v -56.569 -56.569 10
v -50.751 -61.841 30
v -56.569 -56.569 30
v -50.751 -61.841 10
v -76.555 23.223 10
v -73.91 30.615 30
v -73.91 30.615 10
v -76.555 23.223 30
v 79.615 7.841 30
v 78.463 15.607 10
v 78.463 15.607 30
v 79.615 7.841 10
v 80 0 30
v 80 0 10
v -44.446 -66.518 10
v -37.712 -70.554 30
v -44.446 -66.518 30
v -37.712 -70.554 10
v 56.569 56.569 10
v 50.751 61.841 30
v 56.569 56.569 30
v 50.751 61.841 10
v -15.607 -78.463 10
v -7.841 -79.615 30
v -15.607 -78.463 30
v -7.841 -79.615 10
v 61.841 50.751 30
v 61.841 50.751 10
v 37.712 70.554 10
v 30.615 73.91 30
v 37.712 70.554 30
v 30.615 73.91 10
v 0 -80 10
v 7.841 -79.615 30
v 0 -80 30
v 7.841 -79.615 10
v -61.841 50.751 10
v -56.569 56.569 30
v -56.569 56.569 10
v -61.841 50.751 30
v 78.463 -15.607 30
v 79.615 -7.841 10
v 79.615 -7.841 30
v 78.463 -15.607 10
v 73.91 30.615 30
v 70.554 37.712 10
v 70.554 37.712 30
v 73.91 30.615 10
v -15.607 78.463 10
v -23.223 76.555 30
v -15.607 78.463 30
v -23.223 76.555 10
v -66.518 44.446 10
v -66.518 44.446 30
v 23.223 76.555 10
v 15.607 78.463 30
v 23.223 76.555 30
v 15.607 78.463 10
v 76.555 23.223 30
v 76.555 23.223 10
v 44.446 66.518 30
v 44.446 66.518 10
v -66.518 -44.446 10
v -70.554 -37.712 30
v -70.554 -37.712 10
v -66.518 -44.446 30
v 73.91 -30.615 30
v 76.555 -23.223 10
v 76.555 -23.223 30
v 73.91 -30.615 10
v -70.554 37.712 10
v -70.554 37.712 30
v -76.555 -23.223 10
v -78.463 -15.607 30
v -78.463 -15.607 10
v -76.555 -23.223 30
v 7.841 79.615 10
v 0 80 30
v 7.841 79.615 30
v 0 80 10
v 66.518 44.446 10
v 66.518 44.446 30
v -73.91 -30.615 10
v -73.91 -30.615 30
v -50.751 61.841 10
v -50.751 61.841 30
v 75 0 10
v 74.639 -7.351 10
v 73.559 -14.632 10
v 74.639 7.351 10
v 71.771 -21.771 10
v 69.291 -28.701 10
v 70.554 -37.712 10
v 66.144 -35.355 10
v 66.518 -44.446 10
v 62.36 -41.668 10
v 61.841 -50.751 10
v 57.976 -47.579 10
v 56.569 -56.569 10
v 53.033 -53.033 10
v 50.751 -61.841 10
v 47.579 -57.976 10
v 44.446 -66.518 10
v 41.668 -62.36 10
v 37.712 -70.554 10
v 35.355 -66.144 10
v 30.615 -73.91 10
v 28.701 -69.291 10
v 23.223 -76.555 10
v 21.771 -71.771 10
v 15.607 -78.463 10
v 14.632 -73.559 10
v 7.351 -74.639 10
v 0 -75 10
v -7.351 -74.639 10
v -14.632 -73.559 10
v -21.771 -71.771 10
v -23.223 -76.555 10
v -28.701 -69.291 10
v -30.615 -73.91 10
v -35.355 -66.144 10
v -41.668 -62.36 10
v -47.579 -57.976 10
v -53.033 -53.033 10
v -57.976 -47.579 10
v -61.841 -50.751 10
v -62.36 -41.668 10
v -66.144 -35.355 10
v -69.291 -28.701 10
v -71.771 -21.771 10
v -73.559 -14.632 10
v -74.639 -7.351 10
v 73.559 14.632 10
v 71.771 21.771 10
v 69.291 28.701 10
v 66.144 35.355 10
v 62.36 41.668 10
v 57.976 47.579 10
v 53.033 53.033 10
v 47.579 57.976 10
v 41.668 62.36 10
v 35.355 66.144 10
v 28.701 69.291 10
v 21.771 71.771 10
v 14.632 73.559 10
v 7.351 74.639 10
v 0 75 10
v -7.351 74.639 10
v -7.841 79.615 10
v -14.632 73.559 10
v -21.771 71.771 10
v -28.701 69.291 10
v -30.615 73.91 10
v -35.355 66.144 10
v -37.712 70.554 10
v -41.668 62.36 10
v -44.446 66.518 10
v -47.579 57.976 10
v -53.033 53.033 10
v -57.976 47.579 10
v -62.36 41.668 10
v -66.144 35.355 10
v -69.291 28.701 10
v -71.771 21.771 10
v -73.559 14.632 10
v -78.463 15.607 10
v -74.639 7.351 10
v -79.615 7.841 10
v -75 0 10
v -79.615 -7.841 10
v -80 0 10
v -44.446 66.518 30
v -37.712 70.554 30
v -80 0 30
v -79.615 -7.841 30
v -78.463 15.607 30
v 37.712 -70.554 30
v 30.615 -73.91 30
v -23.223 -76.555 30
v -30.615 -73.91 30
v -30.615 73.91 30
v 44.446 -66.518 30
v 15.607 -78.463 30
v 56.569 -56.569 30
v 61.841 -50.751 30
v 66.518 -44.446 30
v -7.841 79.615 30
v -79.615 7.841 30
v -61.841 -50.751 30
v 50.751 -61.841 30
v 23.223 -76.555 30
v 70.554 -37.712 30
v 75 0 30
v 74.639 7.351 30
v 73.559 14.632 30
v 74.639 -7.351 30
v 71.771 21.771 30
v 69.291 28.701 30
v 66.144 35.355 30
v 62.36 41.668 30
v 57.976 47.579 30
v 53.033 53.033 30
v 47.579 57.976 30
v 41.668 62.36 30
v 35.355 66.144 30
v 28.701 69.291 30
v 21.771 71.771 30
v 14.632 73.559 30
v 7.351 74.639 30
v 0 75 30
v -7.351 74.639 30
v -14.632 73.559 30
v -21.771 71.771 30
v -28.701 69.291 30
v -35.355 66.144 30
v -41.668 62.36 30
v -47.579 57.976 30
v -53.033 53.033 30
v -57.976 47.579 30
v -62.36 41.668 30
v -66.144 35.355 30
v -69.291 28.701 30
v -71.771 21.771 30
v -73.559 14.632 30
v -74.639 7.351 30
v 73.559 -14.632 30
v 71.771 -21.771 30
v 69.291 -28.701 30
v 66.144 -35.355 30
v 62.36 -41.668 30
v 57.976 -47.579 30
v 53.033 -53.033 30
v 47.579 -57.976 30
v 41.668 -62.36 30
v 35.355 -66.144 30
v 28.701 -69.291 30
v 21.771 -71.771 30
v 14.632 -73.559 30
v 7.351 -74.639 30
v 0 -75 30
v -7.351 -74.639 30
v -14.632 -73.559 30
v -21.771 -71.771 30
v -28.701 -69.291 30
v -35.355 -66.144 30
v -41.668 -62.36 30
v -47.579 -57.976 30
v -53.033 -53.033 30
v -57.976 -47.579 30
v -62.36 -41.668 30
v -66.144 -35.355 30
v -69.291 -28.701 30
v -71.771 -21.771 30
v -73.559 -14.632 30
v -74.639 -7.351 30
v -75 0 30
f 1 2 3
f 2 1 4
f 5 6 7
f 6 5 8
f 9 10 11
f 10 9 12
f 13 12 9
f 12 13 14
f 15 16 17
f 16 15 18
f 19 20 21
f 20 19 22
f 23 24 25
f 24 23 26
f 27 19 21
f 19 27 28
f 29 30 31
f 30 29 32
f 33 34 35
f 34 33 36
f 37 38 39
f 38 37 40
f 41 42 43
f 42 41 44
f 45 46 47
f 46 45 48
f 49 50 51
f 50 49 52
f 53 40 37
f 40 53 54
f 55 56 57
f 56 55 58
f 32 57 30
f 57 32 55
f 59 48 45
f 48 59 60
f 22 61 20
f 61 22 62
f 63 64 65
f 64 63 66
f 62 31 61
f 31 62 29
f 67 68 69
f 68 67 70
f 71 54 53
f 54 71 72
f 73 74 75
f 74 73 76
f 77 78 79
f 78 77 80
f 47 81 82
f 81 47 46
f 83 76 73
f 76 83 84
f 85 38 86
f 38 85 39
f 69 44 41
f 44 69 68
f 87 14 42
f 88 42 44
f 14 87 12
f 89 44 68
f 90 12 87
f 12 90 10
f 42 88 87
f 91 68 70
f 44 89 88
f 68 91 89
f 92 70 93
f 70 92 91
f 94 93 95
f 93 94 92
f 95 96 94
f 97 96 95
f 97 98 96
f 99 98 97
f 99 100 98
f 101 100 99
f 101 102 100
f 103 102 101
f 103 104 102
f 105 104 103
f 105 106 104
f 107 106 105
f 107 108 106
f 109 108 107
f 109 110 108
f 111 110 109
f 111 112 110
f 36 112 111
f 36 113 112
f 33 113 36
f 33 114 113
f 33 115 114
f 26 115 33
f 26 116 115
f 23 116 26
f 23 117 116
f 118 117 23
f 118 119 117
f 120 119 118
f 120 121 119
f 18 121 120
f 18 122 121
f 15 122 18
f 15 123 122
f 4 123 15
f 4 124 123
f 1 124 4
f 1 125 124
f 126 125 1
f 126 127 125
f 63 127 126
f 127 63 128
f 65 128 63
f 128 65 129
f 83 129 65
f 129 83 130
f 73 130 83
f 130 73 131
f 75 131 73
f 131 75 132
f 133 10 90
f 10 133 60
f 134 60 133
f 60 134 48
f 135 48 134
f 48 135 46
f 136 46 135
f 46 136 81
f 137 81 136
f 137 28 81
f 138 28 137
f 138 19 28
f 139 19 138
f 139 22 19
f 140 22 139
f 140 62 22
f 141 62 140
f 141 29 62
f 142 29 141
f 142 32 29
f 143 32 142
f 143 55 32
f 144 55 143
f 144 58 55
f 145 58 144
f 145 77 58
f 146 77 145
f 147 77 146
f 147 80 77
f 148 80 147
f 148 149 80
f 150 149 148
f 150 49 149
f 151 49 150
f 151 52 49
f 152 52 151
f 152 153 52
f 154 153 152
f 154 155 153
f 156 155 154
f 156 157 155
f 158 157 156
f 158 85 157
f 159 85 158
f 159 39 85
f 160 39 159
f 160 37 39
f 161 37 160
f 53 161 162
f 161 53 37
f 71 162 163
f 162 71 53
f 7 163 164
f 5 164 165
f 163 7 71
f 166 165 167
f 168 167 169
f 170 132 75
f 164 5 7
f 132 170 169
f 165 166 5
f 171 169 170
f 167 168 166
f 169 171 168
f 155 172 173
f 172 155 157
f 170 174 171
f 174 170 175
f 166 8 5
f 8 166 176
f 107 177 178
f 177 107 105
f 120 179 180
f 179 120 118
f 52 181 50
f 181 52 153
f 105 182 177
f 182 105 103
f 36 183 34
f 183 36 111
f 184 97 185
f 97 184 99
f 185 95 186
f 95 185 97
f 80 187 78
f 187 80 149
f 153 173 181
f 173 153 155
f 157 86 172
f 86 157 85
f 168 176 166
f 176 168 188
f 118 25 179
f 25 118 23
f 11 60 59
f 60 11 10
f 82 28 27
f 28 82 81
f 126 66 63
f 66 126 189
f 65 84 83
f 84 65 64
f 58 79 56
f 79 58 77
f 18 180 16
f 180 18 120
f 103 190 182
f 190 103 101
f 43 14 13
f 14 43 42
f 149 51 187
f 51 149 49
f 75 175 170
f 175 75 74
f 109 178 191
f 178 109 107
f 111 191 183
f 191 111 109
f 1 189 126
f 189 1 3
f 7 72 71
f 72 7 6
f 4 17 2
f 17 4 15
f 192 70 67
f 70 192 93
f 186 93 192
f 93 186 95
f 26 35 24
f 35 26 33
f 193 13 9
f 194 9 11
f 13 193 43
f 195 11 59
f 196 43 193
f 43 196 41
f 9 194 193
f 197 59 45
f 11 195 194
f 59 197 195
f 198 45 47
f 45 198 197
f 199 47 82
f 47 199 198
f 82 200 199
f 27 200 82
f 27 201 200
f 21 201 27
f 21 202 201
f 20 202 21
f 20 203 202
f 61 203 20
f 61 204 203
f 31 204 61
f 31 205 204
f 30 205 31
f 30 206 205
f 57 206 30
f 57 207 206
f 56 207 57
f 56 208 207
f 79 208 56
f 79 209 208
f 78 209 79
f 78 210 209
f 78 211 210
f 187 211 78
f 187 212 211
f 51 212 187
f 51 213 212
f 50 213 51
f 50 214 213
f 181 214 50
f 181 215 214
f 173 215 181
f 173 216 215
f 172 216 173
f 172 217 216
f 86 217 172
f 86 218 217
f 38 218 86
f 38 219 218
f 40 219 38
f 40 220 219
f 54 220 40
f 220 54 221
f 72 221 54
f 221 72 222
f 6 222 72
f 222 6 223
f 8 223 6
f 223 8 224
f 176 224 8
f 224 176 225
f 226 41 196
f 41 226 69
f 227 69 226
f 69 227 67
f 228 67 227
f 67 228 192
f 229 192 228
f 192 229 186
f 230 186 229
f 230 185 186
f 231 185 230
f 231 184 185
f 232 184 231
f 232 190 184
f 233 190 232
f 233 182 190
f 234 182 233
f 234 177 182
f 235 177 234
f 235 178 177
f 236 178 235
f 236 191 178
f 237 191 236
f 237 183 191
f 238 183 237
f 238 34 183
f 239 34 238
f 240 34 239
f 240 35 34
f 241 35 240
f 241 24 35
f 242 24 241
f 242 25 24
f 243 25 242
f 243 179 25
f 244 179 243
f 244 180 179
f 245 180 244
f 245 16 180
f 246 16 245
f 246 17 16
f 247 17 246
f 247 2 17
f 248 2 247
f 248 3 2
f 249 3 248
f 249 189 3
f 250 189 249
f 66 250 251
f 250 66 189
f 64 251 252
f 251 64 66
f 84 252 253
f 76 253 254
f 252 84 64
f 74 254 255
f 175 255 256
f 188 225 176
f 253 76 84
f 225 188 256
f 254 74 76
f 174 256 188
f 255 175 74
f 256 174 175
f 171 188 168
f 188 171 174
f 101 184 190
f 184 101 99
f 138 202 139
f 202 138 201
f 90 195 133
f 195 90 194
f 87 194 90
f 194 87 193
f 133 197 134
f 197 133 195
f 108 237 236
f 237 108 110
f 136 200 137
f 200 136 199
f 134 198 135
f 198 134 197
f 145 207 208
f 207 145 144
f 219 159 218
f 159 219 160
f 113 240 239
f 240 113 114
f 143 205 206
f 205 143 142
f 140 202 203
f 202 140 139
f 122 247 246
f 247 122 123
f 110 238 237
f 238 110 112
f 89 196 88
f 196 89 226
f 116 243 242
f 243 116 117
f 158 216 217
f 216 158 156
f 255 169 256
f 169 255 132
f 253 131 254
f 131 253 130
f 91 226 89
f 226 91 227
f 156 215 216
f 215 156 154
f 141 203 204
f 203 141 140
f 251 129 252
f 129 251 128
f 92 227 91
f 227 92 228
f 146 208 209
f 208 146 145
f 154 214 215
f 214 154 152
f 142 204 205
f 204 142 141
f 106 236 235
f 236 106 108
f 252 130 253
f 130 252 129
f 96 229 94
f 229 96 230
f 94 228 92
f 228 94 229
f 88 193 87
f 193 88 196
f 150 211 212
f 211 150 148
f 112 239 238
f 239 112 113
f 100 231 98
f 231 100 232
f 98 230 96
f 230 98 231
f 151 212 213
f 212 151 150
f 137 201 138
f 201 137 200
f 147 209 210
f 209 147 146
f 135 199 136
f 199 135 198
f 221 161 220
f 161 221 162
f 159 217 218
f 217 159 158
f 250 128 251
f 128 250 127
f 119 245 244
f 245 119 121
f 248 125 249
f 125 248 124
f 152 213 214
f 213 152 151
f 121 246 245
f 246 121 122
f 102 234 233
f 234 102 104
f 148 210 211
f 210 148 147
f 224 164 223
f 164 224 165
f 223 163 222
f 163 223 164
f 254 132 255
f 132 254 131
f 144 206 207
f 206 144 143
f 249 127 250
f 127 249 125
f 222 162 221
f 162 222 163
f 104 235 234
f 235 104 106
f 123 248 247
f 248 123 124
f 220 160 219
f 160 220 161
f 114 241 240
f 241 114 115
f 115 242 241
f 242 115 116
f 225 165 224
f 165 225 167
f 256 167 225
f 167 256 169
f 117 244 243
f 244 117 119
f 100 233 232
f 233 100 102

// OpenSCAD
module ht_160_cap() {
    difference() {
        // Outer cap
        cylinder(h=20, d=160, $fn=64);
        // Inner hollow part
        translate([0, 0, -1])
            cylinder(h=21, d=150, $fn=64);
    }
}

translate([0, 0, 10])
    ht_160_cap();
